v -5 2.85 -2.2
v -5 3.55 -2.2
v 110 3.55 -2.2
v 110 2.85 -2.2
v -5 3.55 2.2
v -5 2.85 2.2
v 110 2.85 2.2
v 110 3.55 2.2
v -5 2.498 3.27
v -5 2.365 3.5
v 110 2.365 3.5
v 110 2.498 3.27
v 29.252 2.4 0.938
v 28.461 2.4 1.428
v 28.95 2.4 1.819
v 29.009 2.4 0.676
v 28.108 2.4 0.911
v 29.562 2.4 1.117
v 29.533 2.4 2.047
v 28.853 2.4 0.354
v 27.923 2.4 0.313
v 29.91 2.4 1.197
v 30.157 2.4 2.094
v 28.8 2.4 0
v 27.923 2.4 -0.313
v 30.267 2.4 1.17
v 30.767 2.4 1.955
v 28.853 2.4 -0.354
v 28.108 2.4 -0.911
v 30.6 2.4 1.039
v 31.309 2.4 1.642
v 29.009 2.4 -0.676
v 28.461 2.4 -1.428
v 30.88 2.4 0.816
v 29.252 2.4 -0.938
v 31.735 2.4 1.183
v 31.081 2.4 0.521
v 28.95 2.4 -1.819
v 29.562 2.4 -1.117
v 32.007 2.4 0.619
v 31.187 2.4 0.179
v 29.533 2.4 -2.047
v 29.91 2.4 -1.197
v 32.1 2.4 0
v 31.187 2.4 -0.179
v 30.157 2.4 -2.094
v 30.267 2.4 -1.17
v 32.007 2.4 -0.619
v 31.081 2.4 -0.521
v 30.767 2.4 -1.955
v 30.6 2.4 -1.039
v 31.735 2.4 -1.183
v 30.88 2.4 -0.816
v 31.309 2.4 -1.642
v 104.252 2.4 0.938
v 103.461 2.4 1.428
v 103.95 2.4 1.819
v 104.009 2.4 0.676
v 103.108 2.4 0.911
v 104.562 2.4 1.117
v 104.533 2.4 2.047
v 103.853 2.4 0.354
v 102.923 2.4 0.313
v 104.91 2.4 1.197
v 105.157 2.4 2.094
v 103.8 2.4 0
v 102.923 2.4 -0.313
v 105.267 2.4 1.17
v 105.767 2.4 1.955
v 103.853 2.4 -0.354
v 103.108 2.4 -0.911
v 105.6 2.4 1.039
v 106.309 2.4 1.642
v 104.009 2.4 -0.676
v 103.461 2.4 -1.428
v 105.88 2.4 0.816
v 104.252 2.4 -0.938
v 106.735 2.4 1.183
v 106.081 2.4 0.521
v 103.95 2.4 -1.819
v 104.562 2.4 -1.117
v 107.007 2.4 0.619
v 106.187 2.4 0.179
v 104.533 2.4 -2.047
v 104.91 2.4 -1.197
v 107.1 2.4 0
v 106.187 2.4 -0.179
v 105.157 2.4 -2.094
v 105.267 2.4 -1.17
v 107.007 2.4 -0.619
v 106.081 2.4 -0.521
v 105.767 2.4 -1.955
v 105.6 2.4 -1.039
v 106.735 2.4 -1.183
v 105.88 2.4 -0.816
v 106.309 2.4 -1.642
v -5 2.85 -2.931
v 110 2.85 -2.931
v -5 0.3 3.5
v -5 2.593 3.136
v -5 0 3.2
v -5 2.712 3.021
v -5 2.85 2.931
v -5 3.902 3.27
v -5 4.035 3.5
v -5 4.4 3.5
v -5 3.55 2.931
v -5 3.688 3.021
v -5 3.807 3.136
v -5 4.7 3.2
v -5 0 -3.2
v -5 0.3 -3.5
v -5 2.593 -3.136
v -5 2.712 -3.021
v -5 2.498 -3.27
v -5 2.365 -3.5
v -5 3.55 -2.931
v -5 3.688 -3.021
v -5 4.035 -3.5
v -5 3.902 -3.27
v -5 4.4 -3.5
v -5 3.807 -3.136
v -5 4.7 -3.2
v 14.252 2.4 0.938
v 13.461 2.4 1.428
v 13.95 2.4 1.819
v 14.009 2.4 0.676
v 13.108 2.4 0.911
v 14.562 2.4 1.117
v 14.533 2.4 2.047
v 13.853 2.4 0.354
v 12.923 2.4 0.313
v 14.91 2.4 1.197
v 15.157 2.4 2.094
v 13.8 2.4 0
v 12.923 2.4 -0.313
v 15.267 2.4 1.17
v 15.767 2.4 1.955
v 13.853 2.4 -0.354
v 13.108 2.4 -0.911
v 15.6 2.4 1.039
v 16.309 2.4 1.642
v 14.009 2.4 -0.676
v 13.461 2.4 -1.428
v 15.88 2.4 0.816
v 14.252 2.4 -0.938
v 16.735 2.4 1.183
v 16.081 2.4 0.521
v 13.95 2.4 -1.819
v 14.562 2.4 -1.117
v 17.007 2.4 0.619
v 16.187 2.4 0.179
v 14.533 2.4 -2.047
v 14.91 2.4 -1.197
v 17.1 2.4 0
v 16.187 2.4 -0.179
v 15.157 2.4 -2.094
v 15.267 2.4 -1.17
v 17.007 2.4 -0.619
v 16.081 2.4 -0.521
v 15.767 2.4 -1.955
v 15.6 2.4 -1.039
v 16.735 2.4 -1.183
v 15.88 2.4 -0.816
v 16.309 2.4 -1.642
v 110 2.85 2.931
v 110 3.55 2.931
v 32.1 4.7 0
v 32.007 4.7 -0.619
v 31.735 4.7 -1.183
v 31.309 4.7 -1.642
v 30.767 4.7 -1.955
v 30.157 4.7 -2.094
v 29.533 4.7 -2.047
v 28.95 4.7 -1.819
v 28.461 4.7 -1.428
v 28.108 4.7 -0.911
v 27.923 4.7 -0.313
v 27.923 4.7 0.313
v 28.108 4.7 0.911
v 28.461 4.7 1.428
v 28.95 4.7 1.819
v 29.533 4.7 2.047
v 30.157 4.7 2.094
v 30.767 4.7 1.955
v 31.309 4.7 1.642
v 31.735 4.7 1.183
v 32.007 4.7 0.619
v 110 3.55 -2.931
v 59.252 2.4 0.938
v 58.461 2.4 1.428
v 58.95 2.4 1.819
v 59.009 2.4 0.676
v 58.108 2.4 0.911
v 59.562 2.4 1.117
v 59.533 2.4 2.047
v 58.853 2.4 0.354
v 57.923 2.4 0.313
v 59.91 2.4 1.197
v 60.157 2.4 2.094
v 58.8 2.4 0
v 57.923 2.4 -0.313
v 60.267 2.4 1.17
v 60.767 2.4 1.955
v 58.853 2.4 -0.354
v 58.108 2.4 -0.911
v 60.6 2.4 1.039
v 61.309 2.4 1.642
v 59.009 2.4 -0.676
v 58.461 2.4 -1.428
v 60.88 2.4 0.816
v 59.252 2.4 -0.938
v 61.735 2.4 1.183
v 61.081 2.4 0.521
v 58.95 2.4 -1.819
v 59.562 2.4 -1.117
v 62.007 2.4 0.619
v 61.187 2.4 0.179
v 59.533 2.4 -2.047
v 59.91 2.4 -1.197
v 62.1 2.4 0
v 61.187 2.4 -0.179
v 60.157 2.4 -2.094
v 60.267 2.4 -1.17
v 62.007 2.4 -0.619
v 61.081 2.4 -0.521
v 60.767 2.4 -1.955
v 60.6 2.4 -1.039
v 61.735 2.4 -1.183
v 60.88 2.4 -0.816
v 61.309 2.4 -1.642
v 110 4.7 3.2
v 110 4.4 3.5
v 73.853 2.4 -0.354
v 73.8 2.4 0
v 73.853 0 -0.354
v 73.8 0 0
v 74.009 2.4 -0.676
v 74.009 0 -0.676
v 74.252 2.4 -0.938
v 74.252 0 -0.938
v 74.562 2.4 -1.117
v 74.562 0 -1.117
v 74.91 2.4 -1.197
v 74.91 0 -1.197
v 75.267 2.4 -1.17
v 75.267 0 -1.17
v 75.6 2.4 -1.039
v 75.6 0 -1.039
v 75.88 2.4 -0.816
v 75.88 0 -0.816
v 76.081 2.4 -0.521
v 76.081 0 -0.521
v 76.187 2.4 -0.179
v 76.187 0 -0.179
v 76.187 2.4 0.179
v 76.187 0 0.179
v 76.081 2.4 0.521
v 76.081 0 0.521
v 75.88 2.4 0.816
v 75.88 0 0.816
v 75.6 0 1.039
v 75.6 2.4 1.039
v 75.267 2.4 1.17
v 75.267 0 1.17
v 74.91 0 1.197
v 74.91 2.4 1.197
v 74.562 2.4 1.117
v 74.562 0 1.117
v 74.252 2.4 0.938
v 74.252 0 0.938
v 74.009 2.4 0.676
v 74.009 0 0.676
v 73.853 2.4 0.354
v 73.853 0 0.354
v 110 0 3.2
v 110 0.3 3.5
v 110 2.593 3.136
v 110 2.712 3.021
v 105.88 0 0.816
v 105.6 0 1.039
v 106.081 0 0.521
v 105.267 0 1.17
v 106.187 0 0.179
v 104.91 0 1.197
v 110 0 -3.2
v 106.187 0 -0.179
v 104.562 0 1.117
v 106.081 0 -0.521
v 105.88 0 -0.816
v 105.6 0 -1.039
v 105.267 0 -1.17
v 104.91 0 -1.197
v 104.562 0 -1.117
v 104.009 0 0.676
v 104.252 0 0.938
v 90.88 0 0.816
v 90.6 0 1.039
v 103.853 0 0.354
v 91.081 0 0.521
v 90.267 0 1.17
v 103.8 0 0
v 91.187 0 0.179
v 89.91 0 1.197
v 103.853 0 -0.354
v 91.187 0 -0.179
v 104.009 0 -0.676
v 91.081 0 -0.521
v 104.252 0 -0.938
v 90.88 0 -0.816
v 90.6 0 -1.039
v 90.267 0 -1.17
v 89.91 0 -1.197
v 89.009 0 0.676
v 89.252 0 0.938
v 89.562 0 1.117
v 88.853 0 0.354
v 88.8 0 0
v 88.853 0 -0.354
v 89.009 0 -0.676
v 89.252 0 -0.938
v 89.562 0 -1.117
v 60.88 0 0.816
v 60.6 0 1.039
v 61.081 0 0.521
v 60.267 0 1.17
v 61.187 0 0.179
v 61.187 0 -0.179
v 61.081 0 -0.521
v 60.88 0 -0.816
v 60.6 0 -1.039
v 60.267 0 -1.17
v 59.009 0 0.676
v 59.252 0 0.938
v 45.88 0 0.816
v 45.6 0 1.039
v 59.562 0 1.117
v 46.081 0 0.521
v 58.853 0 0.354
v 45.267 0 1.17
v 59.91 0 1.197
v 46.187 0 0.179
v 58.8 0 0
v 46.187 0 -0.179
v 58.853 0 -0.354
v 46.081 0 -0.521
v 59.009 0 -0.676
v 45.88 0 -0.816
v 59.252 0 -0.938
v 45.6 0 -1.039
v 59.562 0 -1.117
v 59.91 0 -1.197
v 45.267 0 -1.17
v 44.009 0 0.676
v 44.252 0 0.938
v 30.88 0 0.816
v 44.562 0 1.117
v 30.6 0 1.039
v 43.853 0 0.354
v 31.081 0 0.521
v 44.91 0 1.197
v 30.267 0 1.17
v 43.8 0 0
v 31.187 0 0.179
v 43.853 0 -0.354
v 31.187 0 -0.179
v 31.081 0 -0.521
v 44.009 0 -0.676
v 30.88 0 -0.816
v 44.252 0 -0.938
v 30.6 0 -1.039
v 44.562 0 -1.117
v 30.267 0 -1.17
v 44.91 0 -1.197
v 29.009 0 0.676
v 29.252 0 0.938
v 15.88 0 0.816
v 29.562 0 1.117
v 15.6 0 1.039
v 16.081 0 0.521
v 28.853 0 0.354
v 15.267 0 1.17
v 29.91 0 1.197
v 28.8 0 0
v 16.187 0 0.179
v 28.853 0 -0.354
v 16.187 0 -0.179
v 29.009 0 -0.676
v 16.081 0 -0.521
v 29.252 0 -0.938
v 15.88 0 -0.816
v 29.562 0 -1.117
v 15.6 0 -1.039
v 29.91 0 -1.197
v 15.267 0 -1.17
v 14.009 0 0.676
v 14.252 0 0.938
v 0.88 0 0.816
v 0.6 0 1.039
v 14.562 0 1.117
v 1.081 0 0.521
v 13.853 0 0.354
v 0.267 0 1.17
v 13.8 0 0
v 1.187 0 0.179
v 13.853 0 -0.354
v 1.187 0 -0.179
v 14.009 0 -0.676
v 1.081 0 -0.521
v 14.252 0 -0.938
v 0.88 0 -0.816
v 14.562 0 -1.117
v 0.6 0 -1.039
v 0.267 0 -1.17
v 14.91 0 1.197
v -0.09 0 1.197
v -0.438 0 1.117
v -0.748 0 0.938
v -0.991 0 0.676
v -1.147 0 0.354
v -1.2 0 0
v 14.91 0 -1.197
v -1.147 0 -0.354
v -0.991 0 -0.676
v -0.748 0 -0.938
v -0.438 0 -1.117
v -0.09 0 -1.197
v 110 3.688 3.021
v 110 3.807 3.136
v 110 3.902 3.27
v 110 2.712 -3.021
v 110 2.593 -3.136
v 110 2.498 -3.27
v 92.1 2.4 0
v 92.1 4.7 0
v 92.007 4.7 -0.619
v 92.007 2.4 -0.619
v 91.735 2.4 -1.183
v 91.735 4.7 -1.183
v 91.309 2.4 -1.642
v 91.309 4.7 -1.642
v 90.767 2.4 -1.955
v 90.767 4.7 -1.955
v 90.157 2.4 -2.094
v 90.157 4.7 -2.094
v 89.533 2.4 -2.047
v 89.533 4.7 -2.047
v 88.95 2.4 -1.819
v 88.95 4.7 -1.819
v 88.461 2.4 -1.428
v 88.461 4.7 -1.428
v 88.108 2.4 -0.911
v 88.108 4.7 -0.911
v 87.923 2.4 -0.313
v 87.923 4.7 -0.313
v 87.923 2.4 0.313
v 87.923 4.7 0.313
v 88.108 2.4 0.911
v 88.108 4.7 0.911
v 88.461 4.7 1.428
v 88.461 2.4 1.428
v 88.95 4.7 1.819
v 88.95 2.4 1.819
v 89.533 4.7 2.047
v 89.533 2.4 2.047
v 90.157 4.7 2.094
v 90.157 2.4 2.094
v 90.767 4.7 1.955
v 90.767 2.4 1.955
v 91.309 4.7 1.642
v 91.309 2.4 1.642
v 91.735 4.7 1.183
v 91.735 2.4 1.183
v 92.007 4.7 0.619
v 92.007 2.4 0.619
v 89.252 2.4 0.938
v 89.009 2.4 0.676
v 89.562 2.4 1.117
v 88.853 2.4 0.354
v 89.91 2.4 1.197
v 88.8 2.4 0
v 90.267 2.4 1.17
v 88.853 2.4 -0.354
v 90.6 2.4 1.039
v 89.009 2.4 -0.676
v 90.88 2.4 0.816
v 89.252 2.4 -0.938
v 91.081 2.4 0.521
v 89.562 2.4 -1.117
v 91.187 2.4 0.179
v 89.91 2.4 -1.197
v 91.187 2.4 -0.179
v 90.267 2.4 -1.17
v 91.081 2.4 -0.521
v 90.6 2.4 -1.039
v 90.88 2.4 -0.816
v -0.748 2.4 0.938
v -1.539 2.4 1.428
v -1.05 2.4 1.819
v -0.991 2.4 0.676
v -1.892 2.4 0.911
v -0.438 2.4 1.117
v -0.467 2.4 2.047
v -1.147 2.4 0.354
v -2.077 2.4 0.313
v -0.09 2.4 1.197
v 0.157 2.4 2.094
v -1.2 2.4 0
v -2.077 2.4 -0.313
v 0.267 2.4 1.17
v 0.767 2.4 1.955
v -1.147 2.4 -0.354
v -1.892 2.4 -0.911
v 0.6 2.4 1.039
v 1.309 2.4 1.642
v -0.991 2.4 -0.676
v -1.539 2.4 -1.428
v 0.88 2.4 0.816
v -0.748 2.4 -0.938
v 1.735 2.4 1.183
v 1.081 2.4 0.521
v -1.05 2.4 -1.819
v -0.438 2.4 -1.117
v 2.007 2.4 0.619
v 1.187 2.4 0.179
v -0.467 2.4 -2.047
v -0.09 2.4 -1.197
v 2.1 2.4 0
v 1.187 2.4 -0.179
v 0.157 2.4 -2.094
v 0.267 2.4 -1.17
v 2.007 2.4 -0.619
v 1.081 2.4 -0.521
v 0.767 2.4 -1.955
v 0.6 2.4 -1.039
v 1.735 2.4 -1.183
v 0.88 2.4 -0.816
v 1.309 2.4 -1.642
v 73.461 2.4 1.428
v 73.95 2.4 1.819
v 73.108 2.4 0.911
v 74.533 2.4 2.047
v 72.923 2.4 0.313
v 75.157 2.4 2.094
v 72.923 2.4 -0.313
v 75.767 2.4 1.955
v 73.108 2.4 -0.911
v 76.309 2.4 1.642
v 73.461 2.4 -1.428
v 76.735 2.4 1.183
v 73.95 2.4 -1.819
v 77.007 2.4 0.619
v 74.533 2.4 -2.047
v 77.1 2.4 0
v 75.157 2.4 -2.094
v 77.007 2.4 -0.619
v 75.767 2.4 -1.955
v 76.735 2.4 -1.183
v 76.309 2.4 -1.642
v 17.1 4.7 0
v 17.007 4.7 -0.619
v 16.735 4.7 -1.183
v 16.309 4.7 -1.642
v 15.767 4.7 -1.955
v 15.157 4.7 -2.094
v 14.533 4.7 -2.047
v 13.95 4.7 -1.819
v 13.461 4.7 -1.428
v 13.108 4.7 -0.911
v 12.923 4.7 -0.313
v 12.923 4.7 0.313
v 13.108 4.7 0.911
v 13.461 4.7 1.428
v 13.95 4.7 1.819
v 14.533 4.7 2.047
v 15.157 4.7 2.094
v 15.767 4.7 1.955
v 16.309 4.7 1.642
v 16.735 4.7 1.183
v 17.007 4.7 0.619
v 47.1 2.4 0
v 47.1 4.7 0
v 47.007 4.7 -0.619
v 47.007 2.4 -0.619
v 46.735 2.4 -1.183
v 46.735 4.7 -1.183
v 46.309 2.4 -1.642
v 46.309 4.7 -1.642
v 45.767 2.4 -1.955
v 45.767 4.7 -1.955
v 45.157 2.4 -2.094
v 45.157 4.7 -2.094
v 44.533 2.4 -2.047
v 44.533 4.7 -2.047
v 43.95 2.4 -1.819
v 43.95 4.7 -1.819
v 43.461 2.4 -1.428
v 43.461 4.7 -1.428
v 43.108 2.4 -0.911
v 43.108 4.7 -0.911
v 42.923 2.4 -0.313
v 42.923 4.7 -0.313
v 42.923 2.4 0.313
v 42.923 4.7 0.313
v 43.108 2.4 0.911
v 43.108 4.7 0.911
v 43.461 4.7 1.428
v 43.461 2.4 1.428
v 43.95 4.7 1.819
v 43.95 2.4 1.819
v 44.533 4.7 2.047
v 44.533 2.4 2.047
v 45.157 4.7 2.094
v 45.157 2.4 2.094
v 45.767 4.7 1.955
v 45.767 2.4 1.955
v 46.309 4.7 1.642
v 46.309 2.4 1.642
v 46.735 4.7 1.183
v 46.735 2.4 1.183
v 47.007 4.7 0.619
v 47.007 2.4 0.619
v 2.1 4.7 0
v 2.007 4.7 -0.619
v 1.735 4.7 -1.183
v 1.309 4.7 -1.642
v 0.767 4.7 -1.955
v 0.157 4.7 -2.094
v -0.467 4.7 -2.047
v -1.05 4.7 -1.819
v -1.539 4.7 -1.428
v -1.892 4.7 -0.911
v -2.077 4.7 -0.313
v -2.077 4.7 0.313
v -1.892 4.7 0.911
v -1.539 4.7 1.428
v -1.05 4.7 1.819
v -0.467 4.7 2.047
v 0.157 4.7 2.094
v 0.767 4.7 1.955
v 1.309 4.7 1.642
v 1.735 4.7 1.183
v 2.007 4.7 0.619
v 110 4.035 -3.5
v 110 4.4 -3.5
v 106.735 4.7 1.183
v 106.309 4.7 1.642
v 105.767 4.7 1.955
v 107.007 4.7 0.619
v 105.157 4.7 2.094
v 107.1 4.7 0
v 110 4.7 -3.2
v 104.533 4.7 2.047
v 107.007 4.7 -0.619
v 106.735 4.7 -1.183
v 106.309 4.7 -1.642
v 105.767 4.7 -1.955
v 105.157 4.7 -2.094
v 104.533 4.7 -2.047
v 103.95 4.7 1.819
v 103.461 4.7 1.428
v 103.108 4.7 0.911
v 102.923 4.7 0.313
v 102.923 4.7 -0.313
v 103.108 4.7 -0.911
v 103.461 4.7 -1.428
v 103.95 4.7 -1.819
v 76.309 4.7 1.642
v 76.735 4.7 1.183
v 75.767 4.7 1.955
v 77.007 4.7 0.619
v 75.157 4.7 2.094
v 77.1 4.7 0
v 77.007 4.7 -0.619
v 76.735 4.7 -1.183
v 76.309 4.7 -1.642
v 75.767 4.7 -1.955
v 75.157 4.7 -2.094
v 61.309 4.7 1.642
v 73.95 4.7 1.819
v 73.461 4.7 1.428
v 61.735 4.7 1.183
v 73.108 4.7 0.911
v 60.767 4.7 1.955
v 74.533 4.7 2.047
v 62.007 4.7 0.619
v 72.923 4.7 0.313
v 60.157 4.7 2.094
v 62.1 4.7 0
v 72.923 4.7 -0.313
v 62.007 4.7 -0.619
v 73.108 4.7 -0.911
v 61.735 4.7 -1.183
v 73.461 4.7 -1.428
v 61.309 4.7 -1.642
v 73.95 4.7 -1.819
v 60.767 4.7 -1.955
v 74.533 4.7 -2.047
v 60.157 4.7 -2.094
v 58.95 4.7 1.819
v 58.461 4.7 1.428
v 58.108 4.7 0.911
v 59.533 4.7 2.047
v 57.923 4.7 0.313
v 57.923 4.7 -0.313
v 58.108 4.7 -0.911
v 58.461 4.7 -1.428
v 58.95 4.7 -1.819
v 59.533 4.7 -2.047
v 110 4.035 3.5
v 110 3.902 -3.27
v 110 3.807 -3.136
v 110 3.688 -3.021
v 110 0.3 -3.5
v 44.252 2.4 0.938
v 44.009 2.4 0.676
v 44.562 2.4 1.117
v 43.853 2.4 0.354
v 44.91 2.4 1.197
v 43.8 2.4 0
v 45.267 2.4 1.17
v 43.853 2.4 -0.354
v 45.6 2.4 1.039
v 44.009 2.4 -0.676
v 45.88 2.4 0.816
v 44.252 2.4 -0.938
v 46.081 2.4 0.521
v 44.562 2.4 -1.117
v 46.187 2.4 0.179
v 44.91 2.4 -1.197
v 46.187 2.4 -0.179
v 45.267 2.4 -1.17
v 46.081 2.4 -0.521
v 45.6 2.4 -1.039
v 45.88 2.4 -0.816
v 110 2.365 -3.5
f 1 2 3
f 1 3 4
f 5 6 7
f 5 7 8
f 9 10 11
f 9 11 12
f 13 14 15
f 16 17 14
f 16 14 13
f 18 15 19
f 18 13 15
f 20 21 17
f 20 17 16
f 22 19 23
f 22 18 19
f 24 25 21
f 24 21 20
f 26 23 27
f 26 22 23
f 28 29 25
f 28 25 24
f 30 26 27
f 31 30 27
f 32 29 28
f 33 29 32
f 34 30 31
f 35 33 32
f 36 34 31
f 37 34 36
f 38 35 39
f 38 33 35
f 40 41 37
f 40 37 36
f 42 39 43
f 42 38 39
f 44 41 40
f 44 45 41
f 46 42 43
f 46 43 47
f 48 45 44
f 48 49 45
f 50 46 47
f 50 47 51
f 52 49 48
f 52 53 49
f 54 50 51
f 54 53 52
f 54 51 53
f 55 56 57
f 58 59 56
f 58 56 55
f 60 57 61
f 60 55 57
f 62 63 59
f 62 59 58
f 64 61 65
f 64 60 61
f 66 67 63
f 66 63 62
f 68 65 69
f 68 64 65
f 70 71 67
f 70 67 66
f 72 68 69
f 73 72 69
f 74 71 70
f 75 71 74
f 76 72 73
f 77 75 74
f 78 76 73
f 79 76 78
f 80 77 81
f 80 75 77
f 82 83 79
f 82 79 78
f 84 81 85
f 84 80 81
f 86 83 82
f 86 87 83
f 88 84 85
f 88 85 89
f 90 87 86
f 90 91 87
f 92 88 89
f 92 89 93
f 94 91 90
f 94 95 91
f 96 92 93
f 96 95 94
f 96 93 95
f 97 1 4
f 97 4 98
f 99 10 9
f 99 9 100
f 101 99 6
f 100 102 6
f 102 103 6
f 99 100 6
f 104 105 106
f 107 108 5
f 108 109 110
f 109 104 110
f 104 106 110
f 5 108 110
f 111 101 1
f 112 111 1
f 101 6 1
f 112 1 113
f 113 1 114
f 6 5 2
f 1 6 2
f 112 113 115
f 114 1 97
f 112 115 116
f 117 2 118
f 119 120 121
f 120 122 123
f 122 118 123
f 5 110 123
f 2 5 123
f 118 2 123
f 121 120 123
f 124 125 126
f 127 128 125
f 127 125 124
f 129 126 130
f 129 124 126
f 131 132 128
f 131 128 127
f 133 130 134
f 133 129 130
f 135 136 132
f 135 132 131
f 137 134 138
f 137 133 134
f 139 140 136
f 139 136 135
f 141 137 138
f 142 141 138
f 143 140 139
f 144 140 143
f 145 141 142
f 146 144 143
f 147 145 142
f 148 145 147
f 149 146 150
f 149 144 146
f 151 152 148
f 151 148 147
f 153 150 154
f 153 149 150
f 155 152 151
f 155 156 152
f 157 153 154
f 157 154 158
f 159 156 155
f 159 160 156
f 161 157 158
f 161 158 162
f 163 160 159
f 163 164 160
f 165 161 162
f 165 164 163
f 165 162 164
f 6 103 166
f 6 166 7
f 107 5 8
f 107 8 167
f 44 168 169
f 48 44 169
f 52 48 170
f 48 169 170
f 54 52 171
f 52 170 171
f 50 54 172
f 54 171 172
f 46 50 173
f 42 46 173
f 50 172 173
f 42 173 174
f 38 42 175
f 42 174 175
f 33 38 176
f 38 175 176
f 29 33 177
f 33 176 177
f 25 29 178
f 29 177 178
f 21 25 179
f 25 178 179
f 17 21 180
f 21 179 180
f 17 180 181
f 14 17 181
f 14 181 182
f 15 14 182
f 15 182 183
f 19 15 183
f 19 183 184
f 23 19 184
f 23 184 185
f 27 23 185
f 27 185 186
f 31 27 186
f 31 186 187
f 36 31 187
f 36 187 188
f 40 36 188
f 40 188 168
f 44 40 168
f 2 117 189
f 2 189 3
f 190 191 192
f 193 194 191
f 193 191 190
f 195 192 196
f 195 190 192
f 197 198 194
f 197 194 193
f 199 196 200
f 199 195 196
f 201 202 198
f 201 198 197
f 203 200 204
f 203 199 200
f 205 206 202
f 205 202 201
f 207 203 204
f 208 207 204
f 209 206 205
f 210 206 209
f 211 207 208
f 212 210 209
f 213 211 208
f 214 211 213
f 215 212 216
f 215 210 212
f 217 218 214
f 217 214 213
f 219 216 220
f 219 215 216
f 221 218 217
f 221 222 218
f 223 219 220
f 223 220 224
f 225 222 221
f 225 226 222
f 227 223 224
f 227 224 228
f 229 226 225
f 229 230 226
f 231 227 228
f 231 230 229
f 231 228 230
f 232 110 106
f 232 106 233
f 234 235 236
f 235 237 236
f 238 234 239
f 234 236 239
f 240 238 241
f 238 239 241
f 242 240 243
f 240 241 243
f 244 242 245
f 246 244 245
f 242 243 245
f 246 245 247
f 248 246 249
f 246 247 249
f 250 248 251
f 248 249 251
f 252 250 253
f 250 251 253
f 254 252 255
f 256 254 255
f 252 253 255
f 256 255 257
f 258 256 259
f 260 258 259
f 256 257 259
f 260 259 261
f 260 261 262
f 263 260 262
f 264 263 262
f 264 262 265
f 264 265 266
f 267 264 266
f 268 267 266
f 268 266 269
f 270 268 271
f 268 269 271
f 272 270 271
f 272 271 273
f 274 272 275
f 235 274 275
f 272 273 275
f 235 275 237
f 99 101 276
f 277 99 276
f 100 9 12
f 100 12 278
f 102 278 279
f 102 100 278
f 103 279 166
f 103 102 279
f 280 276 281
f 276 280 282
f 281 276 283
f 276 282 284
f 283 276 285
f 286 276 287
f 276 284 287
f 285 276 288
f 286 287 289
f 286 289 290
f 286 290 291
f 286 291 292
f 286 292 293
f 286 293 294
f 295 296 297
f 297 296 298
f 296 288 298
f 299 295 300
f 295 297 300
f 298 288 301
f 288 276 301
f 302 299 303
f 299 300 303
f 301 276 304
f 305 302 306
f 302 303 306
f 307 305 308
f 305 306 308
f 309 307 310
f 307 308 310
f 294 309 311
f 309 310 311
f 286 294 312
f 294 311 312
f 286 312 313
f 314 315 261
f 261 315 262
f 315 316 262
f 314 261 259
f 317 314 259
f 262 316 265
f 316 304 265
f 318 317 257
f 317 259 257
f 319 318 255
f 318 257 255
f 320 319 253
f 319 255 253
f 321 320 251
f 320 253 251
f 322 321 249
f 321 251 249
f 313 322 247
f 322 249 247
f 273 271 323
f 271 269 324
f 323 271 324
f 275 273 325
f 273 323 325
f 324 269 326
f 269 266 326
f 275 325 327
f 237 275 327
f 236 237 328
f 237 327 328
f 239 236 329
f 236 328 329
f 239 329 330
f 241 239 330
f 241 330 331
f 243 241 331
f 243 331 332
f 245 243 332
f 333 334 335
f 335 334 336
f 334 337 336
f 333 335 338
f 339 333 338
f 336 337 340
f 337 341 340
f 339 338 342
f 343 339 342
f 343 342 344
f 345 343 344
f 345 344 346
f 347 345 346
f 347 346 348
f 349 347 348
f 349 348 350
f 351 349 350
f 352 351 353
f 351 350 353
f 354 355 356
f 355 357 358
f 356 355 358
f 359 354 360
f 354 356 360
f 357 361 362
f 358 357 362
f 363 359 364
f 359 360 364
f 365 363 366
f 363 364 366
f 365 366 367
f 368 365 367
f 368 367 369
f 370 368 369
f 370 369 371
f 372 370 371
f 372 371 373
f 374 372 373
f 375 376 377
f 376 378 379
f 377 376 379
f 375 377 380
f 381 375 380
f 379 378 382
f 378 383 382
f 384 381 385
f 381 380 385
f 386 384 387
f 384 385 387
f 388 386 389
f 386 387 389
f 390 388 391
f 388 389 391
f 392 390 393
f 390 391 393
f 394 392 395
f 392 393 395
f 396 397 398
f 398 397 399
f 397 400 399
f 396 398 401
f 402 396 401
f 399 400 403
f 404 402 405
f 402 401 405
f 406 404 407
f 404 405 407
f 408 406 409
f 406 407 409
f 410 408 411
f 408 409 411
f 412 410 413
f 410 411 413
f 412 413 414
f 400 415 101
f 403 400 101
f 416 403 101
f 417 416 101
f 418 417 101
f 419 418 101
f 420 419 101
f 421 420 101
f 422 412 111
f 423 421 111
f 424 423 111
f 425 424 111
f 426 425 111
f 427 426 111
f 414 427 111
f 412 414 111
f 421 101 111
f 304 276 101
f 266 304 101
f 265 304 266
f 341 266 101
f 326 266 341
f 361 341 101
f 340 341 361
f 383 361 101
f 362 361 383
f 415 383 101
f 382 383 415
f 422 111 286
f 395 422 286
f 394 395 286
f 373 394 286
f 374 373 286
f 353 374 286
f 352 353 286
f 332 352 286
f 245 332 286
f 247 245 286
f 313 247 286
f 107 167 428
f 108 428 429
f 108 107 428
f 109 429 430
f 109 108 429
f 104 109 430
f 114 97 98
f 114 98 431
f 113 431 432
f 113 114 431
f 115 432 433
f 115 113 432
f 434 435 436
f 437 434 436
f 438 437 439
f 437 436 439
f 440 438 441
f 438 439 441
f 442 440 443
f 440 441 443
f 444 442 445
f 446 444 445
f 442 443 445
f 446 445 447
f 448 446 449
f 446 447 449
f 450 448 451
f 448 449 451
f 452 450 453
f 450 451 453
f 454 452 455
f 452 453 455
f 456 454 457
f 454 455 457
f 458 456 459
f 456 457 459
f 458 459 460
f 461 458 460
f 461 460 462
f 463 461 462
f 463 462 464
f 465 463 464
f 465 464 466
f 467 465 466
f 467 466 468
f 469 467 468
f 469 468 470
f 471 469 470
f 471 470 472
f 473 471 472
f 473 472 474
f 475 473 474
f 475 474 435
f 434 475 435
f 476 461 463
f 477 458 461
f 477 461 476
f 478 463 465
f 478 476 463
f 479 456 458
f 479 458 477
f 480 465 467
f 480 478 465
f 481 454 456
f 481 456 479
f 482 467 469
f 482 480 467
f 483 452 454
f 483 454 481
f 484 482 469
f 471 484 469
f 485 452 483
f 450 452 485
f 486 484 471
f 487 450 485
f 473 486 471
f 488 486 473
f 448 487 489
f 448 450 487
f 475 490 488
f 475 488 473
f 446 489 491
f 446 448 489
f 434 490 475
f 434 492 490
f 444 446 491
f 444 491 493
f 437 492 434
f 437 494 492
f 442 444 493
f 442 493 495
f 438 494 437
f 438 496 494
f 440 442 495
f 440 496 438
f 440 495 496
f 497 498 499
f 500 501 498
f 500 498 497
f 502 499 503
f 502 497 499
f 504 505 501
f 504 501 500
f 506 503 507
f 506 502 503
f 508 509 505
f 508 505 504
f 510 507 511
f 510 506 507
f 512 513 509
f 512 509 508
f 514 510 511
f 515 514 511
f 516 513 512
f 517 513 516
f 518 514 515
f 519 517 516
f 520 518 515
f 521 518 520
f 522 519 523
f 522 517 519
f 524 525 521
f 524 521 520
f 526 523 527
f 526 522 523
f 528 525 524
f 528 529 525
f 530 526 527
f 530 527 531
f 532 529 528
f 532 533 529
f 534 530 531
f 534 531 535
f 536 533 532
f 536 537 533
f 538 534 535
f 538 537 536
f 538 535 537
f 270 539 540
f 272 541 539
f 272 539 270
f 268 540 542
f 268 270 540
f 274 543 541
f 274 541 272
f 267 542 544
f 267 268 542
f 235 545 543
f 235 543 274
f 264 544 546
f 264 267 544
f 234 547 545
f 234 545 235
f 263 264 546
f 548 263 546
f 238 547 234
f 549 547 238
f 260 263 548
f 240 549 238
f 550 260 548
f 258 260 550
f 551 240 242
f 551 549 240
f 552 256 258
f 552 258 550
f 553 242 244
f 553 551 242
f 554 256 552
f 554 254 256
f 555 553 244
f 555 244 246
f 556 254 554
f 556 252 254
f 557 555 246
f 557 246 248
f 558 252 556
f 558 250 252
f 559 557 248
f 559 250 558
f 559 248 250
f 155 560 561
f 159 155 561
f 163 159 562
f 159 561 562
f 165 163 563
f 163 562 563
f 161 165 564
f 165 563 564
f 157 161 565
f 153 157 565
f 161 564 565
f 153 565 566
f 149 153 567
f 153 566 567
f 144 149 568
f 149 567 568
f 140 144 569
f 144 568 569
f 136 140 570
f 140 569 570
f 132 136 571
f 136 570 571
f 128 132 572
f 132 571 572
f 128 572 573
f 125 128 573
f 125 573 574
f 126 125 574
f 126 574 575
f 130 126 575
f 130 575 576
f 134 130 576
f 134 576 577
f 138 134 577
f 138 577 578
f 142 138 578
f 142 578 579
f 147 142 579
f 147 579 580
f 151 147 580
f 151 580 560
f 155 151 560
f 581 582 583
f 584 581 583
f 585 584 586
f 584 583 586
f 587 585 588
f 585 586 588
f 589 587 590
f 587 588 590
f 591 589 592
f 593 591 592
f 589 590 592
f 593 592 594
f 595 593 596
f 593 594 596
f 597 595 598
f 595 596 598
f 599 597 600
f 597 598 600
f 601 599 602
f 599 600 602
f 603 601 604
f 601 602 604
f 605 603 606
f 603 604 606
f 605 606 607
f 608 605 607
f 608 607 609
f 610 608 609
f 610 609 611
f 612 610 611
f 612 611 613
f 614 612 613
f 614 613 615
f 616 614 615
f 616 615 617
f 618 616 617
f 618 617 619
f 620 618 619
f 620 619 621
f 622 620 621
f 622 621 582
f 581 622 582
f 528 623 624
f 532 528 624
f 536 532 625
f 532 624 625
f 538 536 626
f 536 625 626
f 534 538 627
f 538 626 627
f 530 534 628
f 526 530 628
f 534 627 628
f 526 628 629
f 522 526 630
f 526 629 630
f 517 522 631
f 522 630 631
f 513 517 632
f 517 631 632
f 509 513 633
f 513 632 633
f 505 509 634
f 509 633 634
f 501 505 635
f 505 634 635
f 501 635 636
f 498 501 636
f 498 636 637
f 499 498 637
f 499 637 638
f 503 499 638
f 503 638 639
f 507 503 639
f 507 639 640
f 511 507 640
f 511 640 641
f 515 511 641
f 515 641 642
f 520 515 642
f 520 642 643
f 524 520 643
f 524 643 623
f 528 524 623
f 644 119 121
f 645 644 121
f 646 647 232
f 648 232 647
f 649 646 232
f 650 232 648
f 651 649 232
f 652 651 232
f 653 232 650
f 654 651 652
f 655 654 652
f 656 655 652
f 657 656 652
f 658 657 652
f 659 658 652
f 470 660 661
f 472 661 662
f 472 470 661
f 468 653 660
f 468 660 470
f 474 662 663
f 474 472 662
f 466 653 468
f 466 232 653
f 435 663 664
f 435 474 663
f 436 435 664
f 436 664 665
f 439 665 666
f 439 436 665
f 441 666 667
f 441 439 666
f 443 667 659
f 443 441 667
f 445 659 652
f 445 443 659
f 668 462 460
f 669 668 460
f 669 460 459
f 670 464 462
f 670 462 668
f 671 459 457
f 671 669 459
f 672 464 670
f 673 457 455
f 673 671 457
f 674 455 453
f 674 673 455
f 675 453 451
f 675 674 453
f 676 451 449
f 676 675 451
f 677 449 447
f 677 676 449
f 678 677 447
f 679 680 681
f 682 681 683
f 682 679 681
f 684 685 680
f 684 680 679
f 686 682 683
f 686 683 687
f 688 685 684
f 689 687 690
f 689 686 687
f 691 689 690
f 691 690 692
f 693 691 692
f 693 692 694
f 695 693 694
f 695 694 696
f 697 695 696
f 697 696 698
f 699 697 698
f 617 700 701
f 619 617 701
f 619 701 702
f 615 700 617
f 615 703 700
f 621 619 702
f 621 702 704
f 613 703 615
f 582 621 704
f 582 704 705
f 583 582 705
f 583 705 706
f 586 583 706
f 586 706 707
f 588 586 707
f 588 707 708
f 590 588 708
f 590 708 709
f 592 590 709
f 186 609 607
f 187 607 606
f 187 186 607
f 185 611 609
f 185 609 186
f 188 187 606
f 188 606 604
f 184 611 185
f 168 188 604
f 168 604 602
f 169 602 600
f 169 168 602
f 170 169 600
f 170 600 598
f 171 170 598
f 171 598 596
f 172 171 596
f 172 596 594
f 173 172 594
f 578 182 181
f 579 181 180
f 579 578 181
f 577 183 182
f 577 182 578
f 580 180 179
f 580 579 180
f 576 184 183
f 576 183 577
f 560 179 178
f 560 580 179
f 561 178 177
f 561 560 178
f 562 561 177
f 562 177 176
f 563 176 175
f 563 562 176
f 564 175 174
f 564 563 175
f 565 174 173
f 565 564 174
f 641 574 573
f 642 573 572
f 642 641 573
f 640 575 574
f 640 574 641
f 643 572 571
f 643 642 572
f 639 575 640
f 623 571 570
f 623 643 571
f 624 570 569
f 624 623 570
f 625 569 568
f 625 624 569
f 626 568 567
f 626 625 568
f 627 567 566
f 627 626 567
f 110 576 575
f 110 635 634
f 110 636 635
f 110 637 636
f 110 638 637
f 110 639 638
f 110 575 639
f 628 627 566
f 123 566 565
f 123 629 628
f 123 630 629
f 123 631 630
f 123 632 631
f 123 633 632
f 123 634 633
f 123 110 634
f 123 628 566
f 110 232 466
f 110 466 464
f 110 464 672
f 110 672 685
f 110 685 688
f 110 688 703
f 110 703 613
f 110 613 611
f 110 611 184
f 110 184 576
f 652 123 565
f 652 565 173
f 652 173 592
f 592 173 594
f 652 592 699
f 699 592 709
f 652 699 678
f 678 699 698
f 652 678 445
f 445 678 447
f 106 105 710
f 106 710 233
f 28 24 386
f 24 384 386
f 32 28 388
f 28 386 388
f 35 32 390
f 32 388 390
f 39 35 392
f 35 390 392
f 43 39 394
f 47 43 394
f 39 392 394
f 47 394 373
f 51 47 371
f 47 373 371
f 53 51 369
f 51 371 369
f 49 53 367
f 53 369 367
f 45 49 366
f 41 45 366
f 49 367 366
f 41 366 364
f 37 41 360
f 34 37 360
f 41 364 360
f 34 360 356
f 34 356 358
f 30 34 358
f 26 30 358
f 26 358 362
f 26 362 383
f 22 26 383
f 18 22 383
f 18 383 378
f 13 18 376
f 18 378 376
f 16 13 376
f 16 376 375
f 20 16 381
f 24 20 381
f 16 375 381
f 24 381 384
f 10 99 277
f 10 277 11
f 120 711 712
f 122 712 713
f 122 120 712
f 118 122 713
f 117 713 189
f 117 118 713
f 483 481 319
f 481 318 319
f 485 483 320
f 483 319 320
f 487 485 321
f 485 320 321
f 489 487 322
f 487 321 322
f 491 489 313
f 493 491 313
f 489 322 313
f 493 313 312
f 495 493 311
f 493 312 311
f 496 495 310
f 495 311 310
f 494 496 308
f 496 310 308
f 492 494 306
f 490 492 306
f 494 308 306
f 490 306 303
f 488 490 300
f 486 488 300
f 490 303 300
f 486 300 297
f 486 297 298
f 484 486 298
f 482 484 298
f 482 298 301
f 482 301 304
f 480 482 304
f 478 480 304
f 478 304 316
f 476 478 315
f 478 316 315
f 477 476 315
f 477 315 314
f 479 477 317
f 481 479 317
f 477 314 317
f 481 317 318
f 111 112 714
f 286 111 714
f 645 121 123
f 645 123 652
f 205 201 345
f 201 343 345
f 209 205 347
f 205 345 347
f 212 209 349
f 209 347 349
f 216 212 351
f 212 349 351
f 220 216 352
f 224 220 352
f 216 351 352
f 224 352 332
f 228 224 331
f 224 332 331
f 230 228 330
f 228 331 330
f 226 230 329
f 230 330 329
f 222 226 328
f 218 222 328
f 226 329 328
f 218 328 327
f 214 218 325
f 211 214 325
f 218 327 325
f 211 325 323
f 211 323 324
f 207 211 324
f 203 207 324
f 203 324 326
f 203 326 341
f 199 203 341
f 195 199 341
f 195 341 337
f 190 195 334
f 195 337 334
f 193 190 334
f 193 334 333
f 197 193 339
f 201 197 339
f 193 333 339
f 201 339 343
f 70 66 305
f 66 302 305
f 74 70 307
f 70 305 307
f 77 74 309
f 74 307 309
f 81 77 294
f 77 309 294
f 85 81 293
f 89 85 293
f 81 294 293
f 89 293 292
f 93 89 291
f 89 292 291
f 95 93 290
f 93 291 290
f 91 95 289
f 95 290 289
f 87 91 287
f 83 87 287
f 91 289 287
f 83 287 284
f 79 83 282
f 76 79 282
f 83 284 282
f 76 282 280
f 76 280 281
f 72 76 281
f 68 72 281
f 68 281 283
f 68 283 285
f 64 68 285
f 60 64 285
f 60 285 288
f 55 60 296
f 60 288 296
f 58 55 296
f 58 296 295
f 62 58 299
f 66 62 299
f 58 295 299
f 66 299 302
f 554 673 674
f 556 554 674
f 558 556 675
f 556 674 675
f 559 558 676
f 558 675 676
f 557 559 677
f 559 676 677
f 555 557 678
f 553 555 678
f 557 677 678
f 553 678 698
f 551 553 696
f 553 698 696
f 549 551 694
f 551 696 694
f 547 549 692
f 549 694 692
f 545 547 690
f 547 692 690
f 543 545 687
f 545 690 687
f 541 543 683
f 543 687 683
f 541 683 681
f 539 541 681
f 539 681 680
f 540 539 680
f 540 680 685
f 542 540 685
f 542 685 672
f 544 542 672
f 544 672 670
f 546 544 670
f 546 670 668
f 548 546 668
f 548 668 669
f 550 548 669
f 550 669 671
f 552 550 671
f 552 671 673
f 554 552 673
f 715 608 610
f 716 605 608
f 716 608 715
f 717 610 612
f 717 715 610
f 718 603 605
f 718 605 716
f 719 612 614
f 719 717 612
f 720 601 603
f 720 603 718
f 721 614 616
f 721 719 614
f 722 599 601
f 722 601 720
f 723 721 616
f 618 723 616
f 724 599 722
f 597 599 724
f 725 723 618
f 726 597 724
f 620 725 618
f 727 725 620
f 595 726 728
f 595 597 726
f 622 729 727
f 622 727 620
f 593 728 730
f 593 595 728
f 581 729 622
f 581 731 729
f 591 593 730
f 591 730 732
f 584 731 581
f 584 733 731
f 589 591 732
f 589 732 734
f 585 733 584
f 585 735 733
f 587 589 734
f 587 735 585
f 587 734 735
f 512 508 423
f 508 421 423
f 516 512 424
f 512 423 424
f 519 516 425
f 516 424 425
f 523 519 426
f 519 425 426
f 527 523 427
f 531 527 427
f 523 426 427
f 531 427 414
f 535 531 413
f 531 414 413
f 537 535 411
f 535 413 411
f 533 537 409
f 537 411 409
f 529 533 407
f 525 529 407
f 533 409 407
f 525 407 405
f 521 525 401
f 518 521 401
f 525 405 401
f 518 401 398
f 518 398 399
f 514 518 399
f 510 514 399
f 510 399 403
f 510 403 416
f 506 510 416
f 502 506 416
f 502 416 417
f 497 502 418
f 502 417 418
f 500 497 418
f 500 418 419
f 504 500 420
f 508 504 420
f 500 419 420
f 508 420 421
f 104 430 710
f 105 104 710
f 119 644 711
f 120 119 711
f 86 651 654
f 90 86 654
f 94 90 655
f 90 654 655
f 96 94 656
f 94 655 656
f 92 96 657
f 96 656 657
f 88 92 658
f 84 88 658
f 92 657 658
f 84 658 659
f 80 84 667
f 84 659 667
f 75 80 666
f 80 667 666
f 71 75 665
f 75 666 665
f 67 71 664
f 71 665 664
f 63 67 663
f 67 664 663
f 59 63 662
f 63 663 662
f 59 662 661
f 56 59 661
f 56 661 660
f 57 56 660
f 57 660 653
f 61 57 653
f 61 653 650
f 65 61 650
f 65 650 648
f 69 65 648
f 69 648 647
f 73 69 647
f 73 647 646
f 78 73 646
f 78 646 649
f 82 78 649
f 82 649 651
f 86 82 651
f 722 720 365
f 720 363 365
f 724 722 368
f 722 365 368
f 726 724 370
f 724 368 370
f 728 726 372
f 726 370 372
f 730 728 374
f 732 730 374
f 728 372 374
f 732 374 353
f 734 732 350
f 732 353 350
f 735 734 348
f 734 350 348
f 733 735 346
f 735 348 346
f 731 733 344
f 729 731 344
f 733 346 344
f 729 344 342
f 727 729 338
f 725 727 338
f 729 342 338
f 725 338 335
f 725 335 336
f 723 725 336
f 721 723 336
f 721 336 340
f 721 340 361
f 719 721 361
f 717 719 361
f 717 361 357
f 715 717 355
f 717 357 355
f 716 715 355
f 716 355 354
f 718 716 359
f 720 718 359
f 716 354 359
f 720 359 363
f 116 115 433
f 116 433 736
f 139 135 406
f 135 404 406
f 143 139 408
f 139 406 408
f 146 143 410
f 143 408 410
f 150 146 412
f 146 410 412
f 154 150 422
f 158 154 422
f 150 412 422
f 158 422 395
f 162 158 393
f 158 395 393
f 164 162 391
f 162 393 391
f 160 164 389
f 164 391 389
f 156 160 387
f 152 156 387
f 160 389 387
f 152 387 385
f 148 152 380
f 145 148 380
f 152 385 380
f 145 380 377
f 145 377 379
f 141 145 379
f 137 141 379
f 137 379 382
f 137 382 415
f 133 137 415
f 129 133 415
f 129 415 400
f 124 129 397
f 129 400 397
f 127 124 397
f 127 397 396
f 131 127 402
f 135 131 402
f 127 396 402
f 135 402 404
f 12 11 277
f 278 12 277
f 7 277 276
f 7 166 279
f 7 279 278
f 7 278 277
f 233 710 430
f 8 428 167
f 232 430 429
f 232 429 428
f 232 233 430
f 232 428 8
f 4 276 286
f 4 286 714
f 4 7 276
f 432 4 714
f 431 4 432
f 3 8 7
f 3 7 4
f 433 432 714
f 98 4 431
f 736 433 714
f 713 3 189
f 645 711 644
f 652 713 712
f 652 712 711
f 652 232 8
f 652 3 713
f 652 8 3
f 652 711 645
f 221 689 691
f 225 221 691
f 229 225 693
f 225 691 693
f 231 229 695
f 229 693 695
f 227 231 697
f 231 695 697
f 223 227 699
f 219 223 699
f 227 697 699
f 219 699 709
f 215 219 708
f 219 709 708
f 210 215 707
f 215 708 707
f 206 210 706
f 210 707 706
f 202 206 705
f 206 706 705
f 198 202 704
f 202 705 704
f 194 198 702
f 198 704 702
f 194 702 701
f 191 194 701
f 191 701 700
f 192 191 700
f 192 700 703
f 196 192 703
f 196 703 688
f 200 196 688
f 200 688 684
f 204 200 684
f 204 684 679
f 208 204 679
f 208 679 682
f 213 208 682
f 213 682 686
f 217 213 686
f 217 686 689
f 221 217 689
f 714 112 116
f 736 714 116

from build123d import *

# Parameters (mm, degrees)
SKETCH1_W                                    = 7
SKETCH1_H                                    = 4.7
BOSS_EXTRUDE1_DEPTH                          = 115
CUT_EXTRUDE1_DEPTH                           = 116
CBORE_FOR_SOCKET_HEAD_CAP_SCREW1_D           = 2.4
CBORE_FOR_SOCKET_HEAD_CAP_SCREW1_CBORE_D     = 4.2
CBORE_FOR_SOCKET_HEAD_CAP_SCREW1_CBORE_DEPTH = 2.3
LPATTERN1_COUNT                              = 8
LPATTERN1_PITCH                              = 15
CHAMFER1_SIZE                                = 0.3
CHAMFER2_SIZE                                = 0.3


with BuildPart() as part:
    # Sketch1 → Boss-Extrude1 (new body)
    with BuildSketch(Plane(origin=(-5, 0, 0), x_dir=(0, 0, -1), z_dir=(1, 0, 0))):
        with Locations((0, 2.35)):
            Rectangle(SKETCH1_W, SKETCH1_H)
    extrude(amount=BOSS_EXTRUDE1_DEPTH)

    # Sketch2 → Cut-Extrude1 (cut, through all)
    with BuildSketch(Plane(origin=(-5, 0, 0), x_dir=(0, 0, -1), z_dir=(1, 0, 0))):
        with BuildLine():
            Line((3.5, 4.034892917), (3.27, 3.902102355))
            ThreePointArc((3.27, 3.902102355), (3.075750359, 3.750022453), (2.931347317, 3.55))
            Line((2.931347317, 3.55), (2.2, 3.55))
            Line((2.2, 3.55), (2.2, 2.85))
            Line((2.2, 2.85), (2.931347317, 2.85))
            ThreePointArc((2.931347317, 2.85), (3.075750359, 2.649977547), (3.27, 2.497897645))
            Line((3.27, 2.497897645), (3.5, 2.365107083))
            Line((3.5, 2.365107083), (3.5, 4.034892917))
        make_face()
        with BuildLine():
            Line((-3.5, 4.034892917), (-3.5, 2.365107083))
            Line((-3.5, 2.365107083), (-3.27, 2.497897645))
            ThreePointArc((-3.27, 2.497897645), (-3.075750359, 2.649977547), (-2.931347317, 2.85))
            Line((-2.931347317, 2.85), (-2.2, 2.85))
            Line((-2.2, 2.85), (-2.2, 3.55))
            Line((-2.2, 3.55), (-2.931347317, 3.55))
            ThreePointArc((-2.931347317, 3.55), (-3.075750359, 3.750022453), (-3.27, 3.902102355))
            Line((-3.27, 3.902102355), (-3.5, 4.034892917))
        make_face()
    extrude(amount=CUT_EXTRUDE1_DEPTH, mode=Mode.SUBTRACT)

    # CBORE for Socket Head Cap Screw1 (through all)
    with Locations(Plane(origin=(0, 4.7, 0), x_dir=(1, 0, 0), z_dir=(0, 1, 0))):
        with Locations((0, 0)):
            cbore_for_socket_head_cap_screw1 = CounterBoreHole(CBORE_FOR_SOCKET_HEAD_CAP_SCREW1_D / 2, CBORE_FOR_SOCKET_HEAD_CAP_SCREW1_CBORE_D / 2, CBORE_FOR_SOCKET_HEAD_CAP_SCREW1_CBORE_DEPTH)

    # LPattern1: CBORE for Socket Head Cap Screw1 ×8
    with Locations(*[(i * LPATTERN1_PITCH, 0, 0) for i in range(1, LPATTERN1_COUNT)]):
        add(cbore_for_socket_head_cap_screw1, mode=Mode.SUBTRACT)

    # Chamfer1
    chamfer1_edges = [part.edges().sort_by_distance(p)[0] for p in [
        (52.5, 4.7, 3.5),
        (52.5, 4.7, -3.5),
    ]]
    chamfer(chamfer1_edges, length=CHAMFER1_SIZE)

    # Chamfer2
    chamfer2_edges = [part.edges().sort_by_distance(p)[0] for p in [
        (52.5, 0, -3.5),
        (52.5, 0, 3.5),
    ]]
    chamfer(chamfer2_edges, length=CHAMFER2_SIZE)


solid = part.part
